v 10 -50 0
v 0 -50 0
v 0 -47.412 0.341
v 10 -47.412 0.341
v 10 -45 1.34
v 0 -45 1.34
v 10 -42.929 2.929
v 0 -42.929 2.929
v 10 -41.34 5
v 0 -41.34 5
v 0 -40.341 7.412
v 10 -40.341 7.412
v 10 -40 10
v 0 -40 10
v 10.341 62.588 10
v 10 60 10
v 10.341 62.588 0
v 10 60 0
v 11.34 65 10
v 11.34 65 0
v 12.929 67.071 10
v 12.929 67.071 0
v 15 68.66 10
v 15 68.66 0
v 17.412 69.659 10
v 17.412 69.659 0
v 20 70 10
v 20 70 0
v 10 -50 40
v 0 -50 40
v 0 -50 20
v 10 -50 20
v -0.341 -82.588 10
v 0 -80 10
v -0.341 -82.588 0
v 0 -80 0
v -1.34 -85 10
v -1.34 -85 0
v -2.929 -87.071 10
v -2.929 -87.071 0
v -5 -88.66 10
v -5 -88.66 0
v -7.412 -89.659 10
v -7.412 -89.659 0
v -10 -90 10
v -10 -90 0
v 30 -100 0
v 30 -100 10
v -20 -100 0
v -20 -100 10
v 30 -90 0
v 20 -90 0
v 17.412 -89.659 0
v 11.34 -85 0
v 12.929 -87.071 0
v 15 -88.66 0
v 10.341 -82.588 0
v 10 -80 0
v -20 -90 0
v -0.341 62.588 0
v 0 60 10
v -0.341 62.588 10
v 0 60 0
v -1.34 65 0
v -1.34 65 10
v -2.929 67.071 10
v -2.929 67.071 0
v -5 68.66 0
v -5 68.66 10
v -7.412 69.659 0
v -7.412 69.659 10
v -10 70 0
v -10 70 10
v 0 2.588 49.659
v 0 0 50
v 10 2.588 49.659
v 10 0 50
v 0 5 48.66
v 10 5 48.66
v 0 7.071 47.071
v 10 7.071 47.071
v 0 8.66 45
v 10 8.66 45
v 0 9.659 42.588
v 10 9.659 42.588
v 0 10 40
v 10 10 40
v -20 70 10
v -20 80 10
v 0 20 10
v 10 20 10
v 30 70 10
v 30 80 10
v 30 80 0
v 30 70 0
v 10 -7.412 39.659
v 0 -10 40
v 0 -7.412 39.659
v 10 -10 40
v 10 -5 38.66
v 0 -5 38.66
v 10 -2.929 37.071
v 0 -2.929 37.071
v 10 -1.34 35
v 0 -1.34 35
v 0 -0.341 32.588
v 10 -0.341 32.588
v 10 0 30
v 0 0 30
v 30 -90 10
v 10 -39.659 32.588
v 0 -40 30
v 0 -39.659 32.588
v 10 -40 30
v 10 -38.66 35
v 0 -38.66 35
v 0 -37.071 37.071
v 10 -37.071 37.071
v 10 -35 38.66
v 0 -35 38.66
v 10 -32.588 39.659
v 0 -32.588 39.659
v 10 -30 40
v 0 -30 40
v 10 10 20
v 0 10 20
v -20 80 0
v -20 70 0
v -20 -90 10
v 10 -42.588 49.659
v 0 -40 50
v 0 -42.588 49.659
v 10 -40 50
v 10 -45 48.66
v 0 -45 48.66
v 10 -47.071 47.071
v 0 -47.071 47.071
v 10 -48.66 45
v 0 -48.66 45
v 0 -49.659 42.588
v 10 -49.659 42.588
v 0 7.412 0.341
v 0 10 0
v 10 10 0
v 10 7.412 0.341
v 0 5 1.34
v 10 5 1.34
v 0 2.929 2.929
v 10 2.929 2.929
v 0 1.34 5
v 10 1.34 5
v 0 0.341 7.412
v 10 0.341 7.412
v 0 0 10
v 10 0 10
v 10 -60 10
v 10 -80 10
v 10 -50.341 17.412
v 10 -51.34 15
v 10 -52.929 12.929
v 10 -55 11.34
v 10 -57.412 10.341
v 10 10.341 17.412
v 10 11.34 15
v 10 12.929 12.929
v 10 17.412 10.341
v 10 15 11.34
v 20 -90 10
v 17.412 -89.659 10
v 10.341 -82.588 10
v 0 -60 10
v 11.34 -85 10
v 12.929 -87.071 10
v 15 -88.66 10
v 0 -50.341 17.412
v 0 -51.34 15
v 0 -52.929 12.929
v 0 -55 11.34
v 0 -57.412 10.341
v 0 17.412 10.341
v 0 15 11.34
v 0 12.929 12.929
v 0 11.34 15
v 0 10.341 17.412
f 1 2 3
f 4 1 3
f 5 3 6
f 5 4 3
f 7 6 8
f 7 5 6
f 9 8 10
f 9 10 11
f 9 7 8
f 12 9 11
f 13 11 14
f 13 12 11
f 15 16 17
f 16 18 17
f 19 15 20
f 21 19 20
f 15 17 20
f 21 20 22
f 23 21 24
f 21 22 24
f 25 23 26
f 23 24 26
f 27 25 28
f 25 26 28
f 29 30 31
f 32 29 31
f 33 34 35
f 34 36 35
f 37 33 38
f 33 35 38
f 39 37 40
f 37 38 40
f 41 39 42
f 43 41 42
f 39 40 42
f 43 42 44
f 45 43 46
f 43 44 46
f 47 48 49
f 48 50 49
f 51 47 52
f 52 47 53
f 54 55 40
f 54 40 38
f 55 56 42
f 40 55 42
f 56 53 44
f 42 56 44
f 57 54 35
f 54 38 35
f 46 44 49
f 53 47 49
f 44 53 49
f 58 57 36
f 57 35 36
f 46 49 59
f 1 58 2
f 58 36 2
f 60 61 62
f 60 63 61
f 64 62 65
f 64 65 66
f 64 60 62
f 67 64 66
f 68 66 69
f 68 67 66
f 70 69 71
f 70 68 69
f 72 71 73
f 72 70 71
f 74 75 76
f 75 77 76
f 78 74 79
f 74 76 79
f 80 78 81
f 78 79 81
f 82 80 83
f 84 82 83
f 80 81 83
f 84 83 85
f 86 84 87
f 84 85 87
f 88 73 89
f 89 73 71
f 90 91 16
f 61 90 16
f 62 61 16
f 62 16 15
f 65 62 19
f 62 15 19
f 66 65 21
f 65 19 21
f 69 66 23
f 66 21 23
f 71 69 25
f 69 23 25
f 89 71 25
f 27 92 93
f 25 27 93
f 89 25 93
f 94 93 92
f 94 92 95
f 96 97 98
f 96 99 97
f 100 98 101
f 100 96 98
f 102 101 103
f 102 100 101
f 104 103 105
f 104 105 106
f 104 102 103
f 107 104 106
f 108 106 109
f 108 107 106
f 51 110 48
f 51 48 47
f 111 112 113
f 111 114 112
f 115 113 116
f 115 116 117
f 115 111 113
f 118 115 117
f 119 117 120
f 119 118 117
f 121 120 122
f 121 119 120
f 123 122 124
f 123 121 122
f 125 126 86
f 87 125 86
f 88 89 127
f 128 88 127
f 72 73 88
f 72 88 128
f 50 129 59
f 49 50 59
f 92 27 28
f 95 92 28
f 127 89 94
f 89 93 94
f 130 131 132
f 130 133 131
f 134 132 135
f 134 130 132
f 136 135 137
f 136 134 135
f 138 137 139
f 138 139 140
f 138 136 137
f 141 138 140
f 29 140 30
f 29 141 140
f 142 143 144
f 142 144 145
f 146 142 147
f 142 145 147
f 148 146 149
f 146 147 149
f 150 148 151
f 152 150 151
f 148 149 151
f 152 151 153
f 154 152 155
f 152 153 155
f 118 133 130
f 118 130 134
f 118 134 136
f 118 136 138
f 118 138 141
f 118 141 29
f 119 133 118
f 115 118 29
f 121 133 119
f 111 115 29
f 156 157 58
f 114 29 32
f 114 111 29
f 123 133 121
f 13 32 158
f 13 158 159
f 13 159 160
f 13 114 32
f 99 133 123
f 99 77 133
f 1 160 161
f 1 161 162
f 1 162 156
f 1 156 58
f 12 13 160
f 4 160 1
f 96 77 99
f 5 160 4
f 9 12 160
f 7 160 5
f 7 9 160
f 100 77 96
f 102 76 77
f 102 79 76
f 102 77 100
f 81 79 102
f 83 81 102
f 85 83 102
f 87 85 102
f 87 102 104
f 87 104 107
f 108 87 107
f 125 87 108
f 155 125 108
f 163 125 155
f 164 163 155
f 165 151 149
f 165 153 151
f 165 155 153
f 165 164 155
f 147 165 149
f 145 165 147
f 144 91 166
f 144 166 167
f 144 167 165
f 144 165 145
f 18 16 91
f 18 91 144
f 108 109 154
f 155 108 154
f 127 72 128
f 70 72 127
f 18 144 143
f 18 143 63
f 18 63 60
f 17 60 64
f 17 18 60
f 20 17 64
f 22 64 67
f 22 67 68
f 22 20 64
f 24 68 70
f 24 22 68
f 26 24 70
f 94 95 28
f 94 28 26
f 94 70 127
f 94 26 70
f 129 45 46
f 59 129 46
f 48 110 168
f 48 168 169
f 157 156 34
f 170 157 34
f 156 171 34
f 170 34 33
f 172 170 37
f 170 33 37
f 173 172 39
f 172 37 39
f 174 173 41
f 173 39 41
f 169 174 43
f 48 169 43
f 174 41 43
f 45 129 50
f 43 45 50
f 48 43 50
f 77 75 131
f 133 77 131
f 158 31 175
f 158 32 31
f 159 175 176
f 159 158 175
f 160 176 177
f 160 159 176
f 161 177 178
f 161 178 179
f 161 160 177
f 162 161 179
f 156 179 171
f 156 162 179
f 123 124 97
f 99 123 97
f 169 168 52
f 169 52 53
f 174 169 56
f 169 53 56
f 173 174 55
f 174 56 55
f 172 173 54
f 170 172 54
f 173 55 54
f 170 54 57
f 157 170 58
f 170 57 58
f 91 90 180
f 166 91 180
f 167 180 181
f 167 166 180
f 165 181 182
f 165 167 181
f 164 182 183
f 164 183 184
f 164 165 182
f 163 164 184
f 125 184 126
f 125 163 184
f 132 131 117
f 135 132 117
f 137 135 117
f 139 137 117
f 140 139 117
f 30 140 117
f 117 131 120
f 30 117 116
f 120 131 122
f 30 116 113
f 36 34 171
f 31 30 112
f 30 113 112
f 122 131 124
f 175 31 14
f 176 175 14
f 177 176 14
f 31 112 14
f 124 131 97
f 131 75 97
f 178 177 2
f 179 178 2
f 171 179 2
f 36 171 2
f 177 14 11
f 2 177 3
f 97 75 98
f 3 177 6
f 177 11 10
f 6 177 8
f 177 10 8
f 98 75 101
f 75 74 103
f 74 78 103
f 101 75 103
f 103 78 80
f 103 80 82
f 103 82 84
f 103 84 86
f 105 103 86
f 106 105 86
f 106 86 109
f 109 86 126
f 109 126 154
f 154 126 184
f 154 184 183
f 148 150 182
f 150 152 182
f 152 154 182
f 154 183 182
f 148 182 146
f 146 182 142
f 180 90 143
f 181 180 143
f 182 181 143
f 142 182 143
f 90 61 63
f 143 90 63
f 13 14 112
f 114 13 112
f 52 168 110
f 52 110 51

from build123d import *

# Parameters (mm, degrees)
BOSS_EXTRUDE1_DEPTH = 10
SKETCH2_W           = 10
SKETCH2_H           = 10
BOSS_EXTRUDE2_DEPTH = 20
FILLET1_R           = 10


with BuildPart() as part:
    # Sketch1 → Boss-Extrude1 (new body)
    with BuildSketch(Plane(origin=(0, 0, 0), x_dir=(0, 0, -1), z_dir=(1, 0, 0))):
        Polygon((0, 0), (0, 80), (-10, 80), (-10, 10), (-50, 10), (-50, -50), (-10, -50), (-10, -100), (0, -100), (0, -40), (-40, -40), (-40, 0), align=None)
    extrude(amount=BOSS_EXTRUDE1_DEPTH)

    # Sketch2 → Boss-Extrude2 (add)
    with BuildSketch(Plane(origin=(10, 0, 0), x_dir=(0, 0, -1), z_dir=(1, 0, 0))):
        with Locations((-5, 75)):
            Rectangle(SKETCH2_W, SKETCH2_H)
        with Locations((-5, -95)):
            Rectangle(SKETCH2_W, SKETCH2_H)
    boss_extrude2 = extrude(amount=BOSS_EXTRUDE2_DEPTH)

    # Mirror1: Boss-Extrude2 across plane
    add(boss_extrude2.mirror(Plane.ZY.offset(-5)))

    # Fillet1
    fillet1_edges = [part.edges().sort_by_distance(p)[0] for p in [
        (10, -90, 5),
        (5, -40, 40),
        (0, -90, 5),
        (0, 70, 5),
        (5, -40, 0),
        (5, 0, 0),
        (10, 70, 5),
        (5, -50, 50),
        (5, 0, 40),
        (5, 10, 50),
        (5, -50, 10),
        (5, 10, 10),
    ]]
    fillet(fillet1_edges, radius=FILLET1_R)


solid = part.part
